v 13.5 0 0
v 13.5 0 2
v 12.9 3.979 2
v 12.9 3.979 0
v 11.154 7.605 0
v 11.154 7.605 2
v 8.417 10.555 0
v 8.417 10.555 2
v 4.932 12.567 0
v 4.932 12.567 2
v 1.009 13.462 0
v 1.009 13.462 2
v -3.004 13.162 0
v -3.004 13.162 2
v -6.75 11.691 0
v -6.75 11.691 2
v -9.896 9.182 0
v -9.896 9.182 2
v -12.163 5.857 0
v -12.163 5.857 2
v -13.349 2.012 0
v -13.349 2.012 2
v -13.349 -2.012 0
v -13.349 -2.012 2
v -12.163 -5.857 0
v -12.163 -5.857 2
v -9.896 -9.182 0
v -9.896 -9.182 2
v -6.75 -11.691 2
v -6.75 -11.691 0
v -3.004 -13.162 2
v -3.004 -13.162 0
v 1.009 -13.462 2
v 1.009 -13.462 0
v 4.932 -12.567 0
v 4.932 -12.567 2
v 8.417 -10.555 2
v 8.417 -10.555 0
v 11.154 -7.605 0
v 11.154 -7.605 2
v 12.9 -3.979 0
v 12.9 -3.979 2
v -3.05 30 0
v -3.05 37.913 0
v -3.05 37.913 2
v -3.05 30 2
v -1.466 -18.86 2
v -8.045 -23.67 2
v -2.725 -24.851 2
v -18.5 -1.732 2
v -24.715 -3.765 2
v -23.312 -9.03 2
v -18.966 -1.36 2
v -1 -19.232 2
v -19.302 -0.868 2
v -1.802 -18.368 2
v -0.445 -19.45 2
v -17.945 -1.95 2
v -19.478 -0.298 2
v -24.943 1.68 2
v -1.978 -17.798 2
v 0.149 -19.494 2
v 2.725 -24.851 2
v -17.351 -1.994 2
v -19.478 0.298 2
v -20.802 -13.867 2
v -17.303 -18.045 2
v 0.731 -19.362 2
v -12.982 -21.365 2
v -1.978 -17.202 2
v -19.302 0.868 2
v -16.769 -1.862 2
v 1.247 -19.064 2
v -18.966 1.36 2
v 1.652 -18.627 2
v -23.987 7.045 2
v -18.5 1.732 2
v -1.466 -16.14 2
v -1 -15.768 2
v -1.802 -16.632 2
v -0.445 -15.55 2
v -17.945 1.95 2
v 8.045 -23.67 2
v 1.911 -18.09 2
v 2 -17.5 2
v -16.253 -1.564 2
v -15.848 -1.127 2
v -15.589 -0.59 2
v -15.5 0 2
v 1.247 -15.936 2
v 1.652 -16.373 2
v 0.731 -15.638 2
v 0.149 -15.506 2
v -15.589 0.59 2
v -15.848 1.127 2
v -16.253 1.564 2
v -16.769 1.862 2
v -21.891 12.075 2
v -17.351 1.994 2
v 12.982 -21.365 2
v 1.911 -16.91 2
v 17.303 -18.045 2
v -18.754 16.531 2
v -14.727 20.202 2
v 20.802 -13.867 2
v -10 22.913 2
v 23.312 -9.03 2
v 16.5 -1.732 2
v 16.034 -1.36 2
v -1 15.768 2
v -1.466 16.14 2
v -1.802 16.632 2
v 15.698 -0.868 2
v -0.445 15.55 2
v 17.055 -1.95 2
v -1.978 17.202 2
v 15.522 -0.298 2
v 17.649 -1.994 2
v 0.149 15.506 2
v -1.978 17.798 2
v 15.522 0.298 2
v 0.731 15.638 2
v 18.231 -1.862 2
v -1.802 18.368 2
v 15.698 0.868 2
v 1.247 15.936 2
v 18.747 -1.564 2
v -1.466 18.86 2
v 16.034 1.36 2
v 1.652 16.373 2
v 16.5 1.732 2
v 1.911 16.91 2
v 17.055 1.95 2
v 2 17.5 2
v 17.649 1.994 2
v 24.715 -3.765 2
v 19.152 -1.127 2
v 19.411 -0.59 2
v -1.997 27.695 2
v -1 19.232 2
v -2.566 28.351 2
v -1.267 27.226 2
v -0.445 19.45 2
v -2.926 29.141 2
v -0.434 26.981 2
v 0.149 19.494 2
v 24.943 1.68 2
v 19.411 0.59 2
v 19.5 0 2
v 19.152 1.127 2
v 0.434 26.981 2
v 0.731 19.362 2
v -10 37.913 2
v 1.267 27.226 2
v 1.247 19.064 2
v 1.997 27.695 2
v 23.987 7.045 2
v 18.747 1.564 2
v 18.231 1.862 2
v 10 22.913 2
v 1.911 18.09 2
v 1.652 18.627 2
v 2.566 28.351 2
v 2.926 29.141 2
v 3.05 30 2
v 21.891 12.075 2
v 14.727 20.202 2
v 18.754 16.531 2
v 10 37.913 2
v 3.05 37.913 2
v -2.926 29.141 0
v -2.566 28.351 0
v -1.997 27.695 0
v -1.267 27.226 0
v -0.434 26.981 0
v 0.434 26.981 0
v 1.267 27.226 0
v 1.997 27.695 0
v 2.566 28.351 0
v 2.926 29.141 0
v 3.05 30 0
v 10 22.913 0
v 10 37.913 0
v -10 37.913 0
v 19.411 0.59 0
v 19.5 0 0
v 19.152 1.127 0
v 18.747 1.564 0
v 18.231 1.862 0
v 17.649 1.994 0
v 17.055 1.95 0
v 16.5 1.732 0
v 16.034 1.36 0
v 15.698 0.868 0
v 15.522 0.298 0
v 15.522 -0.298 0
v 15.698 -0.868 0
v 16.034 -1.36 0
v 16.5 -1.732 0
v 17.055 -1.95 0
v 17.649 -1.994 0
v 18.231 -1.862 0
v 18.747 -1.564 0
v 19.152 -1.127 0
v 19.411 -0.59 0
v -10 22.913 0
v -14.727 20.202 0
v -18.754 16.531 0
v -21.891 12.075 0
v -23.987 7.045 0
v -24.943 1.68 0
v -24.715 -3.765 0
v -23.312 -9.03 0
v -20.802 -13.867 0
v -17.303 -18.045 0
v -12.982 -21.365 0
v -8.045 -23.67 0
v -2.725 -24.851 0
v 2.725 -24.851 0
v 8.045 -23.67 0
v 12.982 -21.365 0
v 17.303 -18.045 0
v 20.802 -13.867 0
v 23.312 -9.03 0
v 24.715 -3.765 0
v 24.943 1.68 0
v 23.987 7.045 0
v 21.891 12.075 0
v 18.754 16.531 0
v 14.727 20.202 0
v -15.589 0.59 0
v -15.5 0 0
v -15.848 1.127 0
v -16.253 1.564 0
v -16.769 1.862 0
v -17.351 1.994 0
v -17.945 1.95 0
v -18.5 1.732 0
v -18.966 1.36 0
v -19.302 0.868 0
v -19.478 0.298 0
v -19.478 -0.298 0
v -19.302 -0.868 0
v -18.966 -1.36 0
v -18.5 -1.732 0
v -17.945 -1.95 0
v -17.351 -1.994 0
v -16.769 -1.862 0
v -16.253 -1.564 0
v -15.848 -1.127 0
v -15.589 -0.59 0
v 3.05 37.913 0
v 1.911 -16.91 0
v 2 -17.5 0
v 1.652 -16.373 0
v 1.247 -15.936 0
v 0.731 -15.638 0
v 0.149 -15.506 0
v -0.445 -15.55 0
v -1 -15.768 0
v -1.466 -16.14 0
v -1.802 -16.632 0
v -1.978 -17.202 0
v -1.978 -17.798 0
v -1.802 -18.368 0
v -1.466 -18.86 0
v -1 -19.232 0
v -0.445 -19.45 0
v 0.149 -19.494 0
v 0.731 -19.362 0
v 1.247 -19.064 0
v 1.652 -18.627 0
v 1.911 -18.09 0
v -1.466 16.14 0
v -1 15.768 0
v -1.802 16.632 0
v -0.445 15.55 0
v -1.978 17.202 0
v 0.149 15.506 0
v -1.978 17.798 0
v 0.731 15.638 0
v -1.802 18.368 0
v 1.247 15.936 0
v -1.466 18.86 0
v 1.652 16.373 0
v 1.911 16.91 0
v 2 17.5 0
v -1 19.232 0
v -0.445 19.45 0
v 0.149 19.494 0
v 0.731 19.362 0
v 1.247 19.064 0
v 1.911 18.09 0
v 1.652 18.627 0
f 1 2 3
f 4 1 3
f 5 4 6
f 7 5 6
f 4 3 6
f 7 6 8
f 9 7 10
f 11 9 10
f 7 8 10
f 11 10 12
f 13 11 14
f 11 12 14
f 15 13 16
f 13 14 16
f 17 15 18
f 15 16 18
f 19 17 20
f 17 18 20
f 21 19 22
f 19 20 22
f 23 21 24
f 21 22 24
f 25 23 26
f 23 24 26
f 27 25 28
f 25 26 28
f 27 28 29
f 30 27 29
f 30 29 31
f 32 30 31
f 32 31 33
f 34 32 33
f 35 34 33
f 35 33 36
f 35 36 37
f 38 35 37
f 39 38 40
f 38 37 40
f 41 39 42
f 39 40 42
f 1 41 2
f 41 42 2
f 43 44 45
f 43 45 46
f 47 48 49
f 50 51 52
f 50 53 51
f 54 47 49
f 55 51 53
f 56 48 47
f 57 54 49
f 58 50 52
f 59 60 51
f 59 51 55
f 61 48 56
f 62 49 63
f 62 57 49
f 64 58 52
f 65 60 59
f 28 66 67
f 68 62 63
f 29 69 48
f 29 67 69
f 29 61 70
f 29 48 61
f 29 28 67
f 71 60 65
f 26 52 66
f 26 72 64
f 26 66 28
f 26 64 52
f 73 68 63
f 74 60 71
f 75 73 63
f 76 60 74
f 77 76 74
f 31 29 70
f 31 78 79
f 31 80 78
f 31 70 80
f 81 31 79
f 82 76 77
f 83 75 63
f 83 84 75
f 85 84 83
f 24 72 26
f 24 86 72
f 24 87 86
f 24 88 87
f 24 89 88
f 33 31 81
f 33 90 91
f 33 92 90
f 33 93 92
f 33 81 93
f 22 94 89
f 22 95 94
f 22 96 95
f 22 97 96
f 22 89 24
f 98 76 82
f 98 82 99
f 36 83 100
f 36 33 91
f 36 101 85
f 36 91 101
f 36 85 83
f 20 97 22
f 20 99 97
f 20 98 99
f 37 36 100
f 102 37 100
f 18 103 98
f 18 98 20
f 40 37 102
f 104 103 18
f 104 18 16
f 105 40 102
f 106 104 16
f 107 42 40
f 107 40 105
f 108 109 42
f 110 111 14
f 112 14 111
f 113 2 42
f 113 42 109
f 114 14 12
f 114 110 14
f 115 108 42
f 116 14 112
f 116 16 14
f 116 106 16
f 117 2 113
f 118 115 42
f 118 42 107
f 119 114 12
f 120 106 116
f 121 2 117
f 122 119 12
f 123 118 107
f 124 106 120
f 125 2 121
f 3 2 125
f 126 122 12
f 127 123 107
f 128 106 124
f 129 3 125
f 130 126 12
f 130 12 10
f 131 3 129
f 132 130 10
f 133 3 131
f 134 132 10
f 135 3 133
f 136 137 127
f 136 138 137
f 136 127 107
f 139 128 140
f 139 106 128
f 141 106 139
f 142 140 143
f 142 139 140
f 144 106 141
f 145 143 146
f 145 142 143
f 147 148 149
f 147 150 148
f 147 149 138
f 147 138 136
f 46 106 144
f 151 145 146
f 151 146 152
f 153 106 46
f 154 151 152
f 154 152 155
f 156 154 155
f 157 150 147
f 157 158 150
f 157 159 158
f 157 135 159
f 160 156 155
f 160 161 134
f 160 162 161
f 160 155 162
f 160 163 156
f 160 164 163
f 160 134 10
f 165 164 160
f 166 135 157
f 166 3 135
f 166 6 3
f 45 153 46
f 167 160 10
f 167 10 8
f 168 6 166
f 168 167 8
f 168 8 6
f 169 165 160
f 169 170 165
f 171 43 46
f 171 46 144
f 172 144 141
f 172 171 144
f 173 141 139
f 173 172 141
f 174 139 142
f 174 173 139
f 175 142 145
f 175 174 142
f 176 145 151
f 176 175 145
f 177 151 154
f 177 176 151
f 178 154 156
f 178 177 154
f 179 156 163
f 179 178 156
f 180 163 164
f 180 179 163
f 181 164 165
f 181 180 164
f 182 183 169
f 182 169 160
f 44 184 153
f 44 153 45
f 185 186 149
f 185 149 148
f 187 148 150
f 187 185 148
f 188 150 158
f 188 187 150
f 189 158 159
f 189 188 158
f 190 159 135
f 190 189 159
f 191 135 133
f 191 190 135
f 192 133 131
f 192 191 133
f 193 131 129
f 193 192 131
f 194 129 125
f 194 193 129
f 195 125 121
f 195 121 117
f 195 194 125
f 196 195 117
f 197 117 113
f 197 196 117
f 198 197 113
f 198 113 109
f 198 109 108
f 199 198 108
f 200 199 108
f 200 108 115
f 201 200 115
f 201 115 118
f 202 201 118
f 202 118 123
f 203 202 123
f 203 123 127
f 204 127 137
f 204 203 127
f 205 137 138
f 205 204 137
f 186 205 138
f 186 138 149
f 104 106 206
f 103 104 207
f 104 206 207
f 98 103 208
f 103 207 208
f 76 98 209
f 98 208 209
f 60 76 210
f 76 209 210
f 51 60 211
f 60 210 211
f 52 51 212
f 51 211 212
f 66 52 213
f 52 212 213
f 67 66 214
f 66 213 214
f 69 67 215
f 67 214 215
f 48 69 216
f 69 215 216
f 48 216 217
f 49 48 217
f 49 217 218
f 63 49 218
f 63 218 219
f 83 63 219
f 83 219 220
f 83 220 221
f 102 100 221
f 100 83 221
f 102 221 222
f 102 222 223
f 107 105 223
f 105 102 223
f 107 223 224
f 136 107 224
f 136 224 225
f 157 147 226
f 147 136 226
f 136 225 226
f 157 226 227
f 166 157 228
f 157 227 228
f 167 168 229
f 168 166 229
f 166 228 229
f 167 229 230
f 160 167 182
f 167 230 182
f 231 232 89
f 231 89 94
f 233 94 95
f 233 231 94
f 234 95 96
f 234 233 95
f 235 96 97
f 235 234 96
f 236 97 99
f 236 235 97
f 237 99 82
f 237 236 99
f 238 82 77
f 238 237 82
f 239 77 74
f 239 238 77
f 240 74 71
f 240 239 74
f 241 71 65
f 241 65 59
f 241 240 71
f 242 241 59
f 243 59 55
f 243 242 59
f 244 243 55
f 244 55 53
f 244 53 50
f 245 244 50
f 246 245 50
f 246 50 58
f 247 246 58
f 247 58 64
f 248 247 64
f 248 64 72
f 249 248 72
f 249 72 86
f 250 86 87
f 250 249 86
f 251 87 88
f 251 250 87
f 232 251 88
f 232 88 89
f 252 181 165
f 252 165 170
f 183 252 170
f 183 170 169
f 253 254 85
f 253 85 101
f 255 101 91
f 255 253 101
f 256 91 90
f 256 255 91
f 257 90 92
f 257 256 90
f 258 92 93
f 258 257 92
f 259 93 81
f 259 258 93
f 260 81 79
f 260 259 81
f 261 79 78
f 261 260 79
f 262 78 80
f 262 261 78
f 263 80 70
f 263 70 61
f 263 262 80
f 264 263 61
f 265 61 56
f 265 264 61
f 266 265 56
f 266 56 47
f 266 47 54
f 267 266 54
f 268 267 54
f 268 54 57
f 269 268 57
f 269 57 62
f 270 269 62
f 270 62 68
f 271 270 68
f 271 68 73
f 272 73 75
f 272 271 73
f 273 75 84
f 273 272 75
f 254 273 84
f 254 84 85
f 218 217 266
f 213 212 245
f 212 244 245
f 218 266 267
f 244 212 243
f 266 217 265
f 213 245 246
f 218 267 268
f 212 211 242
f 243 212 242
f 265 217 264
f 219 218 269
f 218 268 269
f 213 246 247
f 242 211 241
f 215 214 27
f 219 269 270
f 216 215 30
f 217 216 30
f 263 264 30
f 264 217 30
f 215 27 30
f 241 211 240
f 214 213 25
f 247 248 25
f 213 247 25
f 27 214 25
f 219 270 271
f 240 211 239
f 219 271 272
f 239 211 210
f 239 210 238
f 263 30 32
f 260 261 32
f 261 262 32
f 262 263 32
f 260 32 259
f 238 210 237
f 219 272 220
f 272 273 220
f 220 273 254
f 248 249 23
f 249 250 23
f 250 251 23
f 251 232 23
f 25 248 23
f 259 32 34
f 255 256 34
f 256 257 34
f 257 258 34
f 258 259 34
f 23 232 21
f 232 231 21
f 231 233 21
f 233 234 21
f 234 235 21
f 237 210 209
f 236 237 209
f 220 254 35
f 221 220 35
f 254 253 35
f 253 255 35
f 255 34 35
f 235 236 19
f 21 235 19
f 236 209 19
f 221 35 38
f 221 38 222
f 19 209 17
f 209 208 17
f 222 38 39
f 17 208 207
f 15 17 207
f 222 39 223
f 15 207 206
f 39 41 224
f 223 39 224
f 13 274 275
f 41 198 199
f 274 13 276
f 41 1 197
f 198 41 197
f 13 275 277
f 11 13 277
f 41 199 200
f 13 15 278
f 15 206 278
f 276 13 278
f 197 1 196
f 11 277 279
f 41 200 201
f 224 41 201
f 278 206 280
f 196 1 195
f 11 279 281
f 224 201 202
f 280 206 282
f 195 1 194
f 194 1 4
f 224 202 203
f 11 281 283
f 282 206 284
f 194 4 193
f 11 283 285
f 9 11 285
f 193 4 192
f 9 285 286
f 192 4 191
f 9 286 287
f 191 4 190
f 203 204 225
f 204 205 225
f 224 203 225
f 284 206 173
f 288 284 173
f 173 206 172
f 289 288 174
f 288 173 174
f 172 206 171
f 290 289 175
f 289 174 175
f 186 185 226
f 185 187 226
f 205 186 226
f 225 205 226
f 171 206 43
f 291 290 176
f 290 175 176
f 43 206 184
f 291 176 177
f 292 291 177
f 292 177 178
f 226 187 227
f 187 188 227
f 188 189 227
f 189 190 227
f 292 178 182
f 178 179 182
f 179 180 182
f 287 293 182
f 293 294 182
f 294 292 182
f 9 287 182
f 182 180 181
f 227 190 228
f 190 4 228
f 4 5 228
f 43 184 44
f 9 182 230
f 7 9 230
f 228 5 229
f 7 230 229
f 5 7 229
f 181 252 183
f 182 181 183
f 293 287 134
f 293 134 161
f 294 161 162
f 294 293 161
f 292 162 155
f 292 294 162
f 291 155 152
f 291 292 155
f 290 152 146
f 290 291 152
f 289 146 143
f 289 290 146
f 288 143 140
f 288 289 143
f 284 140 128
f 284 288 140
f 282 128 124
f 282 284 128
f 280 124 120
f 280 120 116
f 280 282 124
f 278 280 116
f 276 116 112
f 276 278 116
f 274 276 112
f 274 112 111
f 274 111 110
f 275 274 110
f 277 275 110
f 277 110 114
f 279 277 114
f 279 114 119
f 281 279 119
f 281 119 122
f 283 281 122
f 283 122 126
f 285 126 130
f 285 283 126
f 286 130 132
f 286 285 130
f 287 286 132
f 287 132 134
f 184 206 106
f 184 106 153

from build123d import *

# Parameters (mm, degrees)
SKETCH_1_R          = 25
SKETCH_1_R_2        = 2
EXTRUDE_1_DEPTH     = 2
EXTRUDE_START       = -2
EXTRUDE_2_DEPTH     = 2
SKETCH_3_R          = 13.5
CUT_EXTRUDE_1_DEPTH = 2


with BuildPart() as part:
    # 草图1 → 凸台-拉伸1 (new body)
    with BuildSketch(Plane.XY):
        Circle(SKETCH_1_R)
        with Locations((0, 17.5)):
            Circle(SKETCH_1_R_2, mode=Mode.SUBTRACT)
        with Locations((17.5, 0)):
            Circle(SKETCH_1_R_2, mode=Mode.SUBTRACT)
        with Locations((0, -17.5)):
            Circle(SKETCH_1_R_2, mode=Mode.SUBTRACT)
        with Locations((-17.5, 0)):
            Circle(SKETCH_1_R_2, mode=Mode.SUBTRACT)
    extrude(amount=EXTRUDE_1_DEPTH)

    # 草图2 → 凸台-拉伸2 (add)
    with BuildSketch(Plane.XY.offset(2).offset(EXTRUDE_START)):
        with BuildLine():
            Line((-10, 22.912878475), (-10, 37.912878475))
            Line((-10, 37.912878475), (-3.05, 37.912878475))
            Line((-3.05, 37.912878475), (-3.05, 30))
            ThreePointArc((-3.05, 30), (0, 26.95), (3.05, 30))
            Line((3.05, 30), (3.05, 37.912878475))
            Line((3.05, 37.912878475), (10, 37.912878475))
            Line((10, 37.912878475), (10, 22.912878475))
            ThreePointArc((10, 22.912878475), (0, 25), (-10, 22.912878475))
        make_face()
    extrude(amount=EXTRUDE_2_DEPTH)

    # 草图3 → 切除-拉伸1 (cut)
    with BuildSketch(Plane.XY.offset(2)):
        Circle(SKETCH_3_R)
    extrude(amount=-CUT_EXTRUDE_1_DEPTH, mode=Mode.SUBTRACT)


solid = part.part
